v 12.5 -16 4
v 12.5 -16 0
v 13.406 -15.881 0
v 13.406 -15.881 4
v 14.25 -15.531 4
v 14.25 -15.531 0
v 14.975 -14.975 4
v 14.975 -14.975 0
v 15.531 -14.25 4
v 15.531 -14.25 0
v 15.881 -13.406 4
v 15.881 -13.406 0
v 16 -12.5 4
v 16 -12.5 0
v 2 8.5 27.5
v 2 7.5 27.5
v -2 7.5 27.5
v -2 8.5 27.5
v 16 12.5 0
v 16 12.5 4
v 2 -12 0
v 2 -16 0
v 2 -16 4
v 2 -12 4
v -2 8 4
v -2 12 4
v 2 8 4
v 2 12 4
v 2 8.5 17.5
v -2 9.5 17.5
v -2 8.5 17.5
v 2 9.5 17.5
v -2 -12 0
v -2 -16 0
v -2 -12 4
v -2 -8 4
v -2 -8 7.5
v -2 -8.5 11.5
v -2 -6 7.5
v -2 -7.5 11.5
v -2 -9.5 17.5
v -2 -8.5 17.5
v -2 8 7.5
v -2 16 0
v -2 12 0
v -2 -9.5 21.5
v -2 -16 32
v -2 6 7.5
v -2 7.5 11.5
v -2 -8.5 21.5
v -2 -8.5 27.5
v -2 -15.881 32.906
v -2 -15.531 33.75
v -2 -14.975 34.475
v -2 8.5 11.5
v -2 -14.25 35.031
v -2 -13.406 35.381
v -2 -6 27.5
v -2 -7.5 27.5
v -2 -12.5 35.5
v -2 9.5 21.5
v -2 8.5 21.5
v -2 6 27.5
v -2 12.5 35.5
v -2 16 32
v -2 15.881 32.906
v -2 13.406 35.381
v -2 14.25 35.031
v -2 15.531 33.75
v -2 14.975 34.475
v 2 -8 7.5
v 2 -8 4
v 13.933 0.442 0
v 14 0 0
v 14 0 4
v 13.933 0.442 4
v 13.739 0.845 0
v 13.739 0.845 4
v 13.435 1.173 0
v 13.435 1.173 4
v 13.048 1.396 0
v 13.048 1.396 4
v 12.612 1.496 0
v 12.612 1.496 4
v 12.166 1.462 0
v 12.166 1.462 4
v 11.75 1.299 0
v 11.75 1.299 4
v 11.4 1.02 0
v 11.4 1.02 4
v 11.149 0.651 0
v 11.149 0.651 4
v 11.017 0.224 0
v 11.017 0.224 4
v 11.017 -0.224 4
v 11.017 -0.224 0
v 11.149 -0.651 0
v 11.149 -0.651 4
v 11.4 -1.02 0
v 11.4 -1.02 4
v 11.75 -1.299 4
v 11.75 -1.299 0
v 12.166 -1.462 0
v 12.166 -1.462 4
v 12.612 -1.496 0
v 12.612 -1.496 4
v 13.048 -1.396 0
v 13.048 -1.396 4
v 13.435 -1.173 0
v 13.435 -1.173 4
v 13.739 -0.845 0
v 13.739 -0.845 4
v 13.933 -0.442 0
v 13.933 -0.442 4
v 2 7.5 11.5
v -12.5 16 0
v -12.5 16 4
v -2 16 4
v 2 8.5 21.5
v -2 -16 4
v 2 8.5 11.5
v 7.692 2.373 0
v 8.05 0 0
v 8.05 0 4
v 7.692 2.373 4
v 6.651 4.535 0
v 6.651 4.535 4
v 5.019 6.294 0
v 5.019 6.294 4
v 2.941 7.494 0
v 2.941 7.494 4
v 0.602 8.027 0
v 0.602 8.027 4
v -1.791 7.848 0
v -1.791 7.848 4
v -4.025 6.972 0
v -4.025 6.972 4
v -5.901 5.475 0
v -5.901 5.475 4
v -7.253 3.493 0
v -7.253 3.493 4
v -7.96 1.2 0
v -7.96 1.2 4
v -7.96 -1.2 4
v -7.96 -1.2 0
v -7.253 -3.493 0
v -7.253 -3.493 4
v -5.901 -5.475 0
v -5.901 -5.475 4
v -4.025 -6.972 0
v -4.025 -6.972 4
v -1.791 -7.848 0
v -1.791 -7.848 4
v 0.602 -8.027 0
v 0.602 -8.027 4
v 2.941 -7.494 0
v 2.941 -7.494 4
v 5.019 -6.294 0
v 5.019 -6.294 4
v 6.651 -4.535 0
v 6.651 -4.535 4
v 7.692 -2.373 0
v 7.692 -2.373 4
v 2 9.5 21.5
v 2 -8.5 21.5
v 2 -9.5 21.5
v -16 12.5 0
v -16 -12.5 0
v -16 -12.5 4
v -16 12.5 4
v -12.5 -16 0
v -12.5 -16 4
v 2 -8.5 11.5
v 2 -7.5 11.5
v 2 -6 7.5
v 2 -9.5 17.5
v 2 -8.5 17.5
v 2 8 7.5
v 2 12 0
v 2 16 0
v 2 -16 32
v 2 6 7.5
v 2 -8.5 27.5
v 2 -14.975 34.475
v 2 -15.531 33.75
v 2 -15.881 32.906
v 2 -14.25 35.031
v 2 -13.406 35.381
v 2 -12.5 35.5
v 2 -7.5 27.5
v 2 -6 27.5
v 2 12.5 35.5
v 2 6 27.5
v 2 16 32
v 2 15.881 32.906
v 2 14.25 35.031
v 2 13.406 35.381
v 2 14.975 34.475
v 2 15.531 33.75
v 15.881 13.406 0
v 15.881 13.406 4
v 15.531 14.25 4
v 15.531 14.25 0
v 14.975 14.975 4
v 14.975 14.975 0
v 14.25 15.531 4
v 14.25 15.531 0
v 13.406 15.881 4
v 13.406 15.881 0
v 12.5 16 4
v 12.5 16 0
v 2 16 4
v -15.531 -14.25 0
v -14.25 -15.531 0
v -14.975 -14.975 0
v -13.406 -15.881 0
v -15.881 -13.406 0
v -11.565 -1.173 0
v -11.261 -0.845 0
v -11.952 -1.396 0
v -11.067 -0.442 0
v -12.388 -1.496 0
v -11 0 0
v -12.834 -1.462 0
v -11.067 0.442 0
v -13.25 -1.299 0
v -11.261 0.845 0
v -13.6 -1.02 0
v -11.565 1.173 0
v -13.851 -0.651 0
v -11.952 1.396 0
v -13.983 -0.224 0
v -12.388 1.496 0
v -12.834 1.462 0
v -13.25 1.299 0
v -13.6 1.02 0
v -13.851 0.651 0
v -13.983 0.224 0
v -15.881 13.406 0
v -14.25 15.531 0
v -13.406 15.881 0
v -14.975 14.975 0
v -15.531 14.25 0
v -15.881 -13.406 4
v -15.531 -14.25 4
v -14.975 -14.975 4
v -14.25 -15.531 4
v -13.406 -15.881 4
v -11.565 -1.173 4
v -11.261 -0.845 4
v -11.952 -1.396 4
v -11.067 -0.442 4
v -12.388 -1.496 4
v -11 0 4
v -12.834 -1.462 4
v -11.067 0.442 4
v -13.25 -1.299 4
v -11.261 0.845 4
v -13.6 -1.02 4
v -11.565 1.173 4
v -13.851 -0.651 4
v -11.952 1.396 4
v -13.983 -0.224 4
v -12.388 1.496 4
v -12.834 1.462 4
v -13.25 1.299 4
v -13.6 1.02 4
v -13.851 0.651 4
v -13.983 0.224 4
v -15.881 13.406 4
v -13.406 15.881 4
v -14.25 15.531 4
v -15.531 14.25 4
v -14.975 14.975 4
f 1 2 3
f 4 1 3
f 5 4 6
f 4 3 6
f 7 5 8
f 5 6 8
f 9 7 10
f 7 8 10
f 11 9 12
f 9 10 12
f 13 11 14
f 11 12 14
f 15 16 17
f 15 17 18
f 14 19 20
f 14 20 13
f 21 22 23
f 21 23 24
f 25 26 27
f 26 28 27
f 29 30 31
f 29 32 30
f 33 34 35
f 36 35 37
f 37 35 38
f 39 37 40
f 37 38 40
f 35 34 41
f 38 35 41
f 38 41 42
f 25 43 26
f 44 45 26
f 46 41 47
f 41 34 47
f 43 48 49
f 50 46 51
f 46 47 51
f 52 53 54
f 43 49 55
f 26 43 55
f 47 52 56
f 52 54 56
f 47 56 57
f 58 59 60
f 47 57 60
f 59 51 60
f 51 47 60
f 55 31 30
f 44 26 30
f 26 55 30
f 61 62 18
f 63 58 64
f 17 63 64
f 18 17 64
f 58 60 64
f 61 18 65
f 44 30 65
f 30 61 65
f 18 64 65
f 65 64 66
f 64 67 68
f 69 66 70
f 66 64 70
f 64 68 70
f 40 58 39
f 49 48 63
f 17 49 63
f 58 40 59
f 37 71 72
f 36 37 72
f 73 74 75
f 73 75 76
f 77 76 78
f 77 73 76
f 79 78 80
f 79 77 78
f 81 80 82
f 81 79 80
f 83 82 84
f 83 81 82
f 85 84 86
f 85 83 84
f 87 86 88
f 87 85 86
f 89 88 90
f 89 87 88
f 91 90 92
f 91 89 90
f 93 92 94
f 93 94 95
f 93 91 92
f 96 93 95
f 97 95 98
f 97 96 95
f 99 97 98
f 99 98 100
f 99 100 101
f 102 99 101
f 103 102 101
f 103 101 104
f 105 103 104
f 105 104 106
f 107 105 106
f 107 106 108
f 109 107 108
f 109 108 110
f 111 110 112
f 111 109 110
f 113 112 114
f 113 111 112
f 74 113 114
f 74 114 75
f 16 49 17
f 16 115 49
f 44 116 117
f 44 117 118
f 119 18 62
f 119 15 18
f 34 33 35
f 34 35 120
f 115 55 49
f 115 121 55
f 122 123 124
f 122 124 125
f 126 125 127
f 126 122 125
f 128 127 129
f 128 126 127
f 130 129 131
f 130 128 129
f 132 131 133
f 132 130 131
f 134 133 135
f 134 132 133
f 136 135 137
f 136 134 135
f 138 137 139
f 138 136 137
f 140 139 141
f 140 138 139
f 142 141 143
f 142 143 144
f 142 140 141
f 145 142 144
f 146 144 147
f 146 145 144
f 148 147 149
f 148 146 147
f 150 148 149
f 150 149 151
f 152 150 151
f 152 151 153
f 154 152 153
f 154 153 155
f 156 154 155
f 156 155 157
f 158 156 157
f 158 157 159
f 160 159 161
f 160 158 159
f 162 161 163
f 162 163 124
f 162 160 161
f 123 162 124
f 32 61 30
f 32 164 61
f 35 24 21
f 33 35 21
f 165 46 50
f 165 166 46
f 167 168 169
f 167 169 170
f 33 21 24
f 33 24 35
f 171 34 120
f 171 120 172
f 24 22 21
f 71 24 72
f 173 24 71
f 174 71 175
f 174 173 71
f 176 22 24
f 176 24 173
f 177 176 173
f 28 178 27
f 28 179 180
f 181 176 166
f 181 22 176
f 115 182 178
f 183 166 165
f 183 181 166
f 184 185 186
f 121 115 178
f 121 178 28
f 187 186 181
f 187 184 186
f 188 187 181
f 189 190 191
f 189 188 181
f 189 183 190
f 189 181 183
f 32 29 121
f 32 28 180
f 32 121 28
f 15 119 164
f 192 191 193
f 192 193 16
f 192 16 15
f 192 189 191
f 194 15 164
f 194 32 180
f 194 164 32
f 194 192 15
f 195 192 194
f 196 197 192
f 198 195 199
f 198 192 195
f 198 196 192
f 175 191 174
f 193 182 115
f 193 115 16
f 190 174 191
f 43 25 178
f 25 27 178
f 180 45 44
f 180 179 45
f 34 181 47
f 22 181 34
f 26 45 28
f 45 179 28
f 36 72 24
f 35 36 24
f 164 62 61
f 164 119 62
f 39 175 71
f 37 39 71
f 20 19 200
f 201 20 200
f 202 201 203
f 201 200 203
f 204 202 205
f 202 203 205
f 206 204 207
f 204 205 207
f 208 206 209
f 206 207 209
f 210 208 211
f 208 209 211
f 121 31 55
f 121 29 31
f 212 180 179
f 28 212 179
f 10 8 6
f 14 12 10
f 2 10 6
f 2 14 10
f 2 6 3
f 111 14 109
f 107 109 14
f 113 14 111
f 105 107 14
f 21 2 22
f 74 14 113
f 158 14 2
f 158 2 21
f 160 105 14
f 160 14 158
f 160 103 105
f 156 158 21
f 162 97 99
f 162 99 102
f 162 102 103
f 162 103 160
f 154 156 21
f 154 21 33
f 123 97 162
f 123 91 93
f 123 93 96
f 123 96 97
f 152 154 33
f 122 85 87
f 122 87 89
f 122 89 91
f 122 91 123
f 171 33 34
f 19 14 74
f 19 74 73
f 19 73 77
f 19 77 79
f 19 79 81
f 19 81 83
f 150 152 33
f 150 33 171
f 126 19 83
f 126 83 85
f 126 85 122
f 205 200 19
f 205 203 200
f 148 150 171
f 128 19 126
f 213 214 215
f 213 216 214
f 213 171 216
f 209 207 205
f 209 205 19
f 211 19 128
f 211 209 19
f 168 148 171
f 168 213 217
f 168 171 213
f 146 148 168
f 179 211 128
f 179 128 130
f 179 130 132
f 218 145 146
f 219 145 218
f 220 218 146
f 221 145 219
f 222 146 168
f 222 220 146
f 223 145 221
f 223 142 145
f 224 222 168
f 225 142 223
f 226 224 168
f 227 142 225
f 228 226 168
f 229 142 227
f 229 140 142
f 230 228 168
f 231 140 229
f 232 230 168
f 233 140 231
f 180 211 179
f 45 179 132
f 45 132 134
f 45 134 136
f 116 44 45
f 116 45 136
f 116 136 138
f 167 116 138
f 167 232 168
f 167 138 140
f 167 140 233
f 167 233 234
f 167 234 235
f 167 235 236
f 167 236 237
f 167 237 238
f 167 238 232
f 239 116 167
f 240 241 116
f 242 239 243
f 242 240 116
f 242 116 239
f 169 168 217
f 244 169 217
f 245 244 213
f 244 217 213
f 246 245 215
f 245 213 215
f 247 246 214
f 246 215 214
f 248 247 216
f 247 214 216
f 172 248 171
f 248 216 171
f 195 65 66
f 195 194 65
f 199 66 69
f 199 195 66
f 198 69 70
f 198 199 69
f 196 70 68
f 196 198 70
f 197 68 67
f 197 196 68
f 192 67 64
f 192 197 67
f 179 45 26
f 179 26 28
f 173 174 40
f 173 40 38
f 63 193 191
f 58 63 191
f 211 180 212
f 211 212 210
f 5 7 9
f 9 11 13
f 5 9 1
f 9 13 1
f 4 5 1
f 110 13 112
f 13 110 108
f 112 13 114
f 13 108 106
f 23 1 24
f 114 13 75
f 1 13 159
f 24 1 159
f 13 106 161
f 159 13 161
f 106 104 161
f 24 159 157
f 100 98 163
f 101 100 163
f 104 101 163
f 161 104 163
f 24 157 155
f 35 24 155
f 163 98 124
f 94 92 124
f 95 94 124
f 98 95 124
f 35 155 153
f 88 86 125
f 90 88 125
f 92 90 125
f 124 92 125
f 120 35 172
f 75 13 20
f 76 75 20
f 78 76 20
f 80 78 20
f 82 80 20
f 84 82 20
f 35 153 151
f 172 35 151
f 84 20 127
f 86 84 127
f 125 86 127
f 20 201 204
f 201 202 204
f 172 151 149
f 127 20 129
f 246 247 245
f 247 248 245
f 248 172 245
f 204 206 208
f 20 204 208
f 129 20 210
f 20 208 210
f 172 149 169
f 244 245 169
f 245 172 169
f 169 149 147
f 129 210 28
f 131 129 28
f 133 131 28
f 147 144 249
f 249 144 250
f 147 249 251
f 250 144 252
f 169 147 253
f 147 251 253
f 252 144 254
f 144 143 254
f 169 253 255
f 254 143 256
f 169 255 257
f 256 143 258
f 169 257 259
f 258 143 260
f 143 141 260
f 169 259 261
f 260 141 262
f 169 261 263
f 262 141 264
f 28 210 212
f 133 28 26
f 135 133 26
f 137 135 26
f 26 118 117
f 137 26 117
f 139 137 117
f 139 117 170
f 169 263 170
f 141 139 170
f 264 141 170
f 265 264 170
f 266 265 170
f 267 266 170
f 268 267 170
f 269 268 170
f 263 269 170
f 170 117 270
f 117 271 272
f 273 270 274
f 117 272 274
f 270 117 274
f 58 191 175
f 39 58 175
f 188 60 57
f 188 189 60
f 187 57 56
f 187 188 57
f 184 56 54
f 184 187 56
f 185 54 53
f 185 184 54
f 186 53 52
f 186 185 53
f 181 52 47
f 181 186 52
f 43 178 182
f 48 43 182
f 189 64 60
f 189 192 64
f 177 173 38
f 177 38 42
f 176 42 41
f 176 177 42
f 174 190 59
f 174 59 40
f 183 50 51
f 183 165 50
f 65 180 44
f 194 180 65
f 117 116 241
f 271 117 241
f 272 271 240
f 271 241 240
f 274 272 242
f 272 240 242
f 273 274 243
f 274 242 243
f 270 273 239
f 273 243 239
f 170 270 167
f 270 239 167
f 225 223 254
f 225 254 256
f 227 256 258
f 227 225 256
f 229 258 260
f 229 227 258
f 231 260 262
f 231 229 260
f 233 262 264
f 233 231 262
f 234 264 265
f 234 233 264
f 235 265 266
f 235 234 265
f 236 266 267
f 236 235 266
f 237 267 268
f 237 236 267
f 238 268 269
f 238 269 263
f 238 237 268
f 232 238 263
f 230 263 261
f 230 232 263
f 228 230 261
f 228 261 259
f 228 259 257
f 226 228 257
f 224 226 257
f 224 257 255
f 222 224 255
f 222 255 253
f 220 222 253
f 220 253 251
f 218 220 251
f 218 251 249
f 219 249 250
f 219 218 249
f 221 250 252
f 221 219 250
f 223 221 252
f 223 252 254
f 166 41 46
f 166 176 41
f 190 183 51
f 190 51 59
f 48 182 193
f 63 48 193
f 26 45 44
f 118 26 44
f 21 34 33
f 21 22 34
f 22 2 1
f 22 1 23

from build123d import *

# Parameters (mm, degrees)
SKETCH_R          = 8.05
SKETCH_R_2        = 1.5
PAD_DEPTH         = 4
PAD001_DEPTH      = 2
PAD001_DEPTH_BACK = 2


with BuildPart() as body:
    # Sketch → Pad (new body)
    with BuildSketch(Plane.XY):
        with BuildLine():
            Line((-12.5, 16), (-2, 16))
            Line((-2, 12), (-2, 16))
            Line((-2, 12), (2, 12))
            Line((2, 16), (2, 12))
            Line((2, 16), (12.5, 16))
            ThreePointArc((16, 12.5), (14.974874, 14.974874), (12.5, 16))
            Line((16, 12.5), (16, -12.5))
            ThreePointArc((12.5, -16), (14.974874, -14.974874), (16, -12.5))
            Line((12.5, -16), (2, -16))
            Line((2, -16), (2, -12))
            Line((2, -12), (-2, -12))
            Line((-2, -12), (-2, -16))
            Line((-2, -16), (-12.5, -16))
            ThreePointArc((-16, -12.5), (-14.974874, -14.974874), (-12.5, -16))
            Line((-16, -12.5), (-16, 12.5))
            ThreePointArc((-12.5, 16), (-14.974874, 14.974874), (-16, 12.5))
        make_face()
        Circle(SKETCH_R, mode=Mode.SUBTRACT)
        with Locations((-12.5, 0)):
            Circle(SKETCH_R_2, mode=Mode.SUBTRACT)
        with Locations((12.5, 0)):
            Circle(SKETCH_R_2, mode=Mode.SUBTRACT)
    extrude(amount=PAD_DEPTH)


with BuildPart() as body002:
    # Sketch002 → Pad001 (new body, two sides)
    with BuildSketch(Plane.YZ) as pad001_sk:
        with BuildLine():
            Line((-16, 0), (-12, 0))
            Line((-12, 4), (-12, 0))
            Line((-8, 4), (-12, 4))
            Line((-8, 7.5), (-8, 4))
            Line((-6, 7.5), (-8, 7.5))
            Line((-6, 27.5), (-6, 7.5))
            Line((6, 27.5), (-6, 27.5))
            Line((6, 7.5), (6, 27.5))
            Line((8, 7.5), (6, 7.5))
            Line((8, 4), (8, 7.5))
            Line((12, 4), (8, 4))
            Line((12, 0), (12, 4))
            Line((12, 0), (16, 0))
            Line((16, 0), (16, 32))
            ThreePointArc((16, 32), (14.974874, 34.474874), (12.5, 35.5))
            Line((12.5, 35.5), (-12.5, 35.5))
            ThreePointArc((-12.5, 35.5), (-14.974874, 34.474874), (-16, 32))
            Line((-16, 32), (-16, 0))
        make_face()
        Polygon((-8.5, 27.5), (-7.5, 27.5), (-7.5, 11.5), (-8.5, 11.5), (-8.5, 17.5), (-9.5, 17.5), (-9.5, 21.5), (-8.5, 21.5), align=None, mode=Mode.SUBTRACT)
        Polygon((7.5, 27.5), (8.5, 27.5), (8.5, 21.5), (9.5, 21.5), (9.5, 17.5), (8.5, 17.5), (8.5, 11.5), (7.5, 11.5), align=None, mode=Mode.SUBTRACT)
    extrude(amount=PAD001_DEPTH)
    extrude(pad001_sk.sketch, amount=-PAD001_DEPTH_BACK)


solid = Compound([body.part, body002.part])
